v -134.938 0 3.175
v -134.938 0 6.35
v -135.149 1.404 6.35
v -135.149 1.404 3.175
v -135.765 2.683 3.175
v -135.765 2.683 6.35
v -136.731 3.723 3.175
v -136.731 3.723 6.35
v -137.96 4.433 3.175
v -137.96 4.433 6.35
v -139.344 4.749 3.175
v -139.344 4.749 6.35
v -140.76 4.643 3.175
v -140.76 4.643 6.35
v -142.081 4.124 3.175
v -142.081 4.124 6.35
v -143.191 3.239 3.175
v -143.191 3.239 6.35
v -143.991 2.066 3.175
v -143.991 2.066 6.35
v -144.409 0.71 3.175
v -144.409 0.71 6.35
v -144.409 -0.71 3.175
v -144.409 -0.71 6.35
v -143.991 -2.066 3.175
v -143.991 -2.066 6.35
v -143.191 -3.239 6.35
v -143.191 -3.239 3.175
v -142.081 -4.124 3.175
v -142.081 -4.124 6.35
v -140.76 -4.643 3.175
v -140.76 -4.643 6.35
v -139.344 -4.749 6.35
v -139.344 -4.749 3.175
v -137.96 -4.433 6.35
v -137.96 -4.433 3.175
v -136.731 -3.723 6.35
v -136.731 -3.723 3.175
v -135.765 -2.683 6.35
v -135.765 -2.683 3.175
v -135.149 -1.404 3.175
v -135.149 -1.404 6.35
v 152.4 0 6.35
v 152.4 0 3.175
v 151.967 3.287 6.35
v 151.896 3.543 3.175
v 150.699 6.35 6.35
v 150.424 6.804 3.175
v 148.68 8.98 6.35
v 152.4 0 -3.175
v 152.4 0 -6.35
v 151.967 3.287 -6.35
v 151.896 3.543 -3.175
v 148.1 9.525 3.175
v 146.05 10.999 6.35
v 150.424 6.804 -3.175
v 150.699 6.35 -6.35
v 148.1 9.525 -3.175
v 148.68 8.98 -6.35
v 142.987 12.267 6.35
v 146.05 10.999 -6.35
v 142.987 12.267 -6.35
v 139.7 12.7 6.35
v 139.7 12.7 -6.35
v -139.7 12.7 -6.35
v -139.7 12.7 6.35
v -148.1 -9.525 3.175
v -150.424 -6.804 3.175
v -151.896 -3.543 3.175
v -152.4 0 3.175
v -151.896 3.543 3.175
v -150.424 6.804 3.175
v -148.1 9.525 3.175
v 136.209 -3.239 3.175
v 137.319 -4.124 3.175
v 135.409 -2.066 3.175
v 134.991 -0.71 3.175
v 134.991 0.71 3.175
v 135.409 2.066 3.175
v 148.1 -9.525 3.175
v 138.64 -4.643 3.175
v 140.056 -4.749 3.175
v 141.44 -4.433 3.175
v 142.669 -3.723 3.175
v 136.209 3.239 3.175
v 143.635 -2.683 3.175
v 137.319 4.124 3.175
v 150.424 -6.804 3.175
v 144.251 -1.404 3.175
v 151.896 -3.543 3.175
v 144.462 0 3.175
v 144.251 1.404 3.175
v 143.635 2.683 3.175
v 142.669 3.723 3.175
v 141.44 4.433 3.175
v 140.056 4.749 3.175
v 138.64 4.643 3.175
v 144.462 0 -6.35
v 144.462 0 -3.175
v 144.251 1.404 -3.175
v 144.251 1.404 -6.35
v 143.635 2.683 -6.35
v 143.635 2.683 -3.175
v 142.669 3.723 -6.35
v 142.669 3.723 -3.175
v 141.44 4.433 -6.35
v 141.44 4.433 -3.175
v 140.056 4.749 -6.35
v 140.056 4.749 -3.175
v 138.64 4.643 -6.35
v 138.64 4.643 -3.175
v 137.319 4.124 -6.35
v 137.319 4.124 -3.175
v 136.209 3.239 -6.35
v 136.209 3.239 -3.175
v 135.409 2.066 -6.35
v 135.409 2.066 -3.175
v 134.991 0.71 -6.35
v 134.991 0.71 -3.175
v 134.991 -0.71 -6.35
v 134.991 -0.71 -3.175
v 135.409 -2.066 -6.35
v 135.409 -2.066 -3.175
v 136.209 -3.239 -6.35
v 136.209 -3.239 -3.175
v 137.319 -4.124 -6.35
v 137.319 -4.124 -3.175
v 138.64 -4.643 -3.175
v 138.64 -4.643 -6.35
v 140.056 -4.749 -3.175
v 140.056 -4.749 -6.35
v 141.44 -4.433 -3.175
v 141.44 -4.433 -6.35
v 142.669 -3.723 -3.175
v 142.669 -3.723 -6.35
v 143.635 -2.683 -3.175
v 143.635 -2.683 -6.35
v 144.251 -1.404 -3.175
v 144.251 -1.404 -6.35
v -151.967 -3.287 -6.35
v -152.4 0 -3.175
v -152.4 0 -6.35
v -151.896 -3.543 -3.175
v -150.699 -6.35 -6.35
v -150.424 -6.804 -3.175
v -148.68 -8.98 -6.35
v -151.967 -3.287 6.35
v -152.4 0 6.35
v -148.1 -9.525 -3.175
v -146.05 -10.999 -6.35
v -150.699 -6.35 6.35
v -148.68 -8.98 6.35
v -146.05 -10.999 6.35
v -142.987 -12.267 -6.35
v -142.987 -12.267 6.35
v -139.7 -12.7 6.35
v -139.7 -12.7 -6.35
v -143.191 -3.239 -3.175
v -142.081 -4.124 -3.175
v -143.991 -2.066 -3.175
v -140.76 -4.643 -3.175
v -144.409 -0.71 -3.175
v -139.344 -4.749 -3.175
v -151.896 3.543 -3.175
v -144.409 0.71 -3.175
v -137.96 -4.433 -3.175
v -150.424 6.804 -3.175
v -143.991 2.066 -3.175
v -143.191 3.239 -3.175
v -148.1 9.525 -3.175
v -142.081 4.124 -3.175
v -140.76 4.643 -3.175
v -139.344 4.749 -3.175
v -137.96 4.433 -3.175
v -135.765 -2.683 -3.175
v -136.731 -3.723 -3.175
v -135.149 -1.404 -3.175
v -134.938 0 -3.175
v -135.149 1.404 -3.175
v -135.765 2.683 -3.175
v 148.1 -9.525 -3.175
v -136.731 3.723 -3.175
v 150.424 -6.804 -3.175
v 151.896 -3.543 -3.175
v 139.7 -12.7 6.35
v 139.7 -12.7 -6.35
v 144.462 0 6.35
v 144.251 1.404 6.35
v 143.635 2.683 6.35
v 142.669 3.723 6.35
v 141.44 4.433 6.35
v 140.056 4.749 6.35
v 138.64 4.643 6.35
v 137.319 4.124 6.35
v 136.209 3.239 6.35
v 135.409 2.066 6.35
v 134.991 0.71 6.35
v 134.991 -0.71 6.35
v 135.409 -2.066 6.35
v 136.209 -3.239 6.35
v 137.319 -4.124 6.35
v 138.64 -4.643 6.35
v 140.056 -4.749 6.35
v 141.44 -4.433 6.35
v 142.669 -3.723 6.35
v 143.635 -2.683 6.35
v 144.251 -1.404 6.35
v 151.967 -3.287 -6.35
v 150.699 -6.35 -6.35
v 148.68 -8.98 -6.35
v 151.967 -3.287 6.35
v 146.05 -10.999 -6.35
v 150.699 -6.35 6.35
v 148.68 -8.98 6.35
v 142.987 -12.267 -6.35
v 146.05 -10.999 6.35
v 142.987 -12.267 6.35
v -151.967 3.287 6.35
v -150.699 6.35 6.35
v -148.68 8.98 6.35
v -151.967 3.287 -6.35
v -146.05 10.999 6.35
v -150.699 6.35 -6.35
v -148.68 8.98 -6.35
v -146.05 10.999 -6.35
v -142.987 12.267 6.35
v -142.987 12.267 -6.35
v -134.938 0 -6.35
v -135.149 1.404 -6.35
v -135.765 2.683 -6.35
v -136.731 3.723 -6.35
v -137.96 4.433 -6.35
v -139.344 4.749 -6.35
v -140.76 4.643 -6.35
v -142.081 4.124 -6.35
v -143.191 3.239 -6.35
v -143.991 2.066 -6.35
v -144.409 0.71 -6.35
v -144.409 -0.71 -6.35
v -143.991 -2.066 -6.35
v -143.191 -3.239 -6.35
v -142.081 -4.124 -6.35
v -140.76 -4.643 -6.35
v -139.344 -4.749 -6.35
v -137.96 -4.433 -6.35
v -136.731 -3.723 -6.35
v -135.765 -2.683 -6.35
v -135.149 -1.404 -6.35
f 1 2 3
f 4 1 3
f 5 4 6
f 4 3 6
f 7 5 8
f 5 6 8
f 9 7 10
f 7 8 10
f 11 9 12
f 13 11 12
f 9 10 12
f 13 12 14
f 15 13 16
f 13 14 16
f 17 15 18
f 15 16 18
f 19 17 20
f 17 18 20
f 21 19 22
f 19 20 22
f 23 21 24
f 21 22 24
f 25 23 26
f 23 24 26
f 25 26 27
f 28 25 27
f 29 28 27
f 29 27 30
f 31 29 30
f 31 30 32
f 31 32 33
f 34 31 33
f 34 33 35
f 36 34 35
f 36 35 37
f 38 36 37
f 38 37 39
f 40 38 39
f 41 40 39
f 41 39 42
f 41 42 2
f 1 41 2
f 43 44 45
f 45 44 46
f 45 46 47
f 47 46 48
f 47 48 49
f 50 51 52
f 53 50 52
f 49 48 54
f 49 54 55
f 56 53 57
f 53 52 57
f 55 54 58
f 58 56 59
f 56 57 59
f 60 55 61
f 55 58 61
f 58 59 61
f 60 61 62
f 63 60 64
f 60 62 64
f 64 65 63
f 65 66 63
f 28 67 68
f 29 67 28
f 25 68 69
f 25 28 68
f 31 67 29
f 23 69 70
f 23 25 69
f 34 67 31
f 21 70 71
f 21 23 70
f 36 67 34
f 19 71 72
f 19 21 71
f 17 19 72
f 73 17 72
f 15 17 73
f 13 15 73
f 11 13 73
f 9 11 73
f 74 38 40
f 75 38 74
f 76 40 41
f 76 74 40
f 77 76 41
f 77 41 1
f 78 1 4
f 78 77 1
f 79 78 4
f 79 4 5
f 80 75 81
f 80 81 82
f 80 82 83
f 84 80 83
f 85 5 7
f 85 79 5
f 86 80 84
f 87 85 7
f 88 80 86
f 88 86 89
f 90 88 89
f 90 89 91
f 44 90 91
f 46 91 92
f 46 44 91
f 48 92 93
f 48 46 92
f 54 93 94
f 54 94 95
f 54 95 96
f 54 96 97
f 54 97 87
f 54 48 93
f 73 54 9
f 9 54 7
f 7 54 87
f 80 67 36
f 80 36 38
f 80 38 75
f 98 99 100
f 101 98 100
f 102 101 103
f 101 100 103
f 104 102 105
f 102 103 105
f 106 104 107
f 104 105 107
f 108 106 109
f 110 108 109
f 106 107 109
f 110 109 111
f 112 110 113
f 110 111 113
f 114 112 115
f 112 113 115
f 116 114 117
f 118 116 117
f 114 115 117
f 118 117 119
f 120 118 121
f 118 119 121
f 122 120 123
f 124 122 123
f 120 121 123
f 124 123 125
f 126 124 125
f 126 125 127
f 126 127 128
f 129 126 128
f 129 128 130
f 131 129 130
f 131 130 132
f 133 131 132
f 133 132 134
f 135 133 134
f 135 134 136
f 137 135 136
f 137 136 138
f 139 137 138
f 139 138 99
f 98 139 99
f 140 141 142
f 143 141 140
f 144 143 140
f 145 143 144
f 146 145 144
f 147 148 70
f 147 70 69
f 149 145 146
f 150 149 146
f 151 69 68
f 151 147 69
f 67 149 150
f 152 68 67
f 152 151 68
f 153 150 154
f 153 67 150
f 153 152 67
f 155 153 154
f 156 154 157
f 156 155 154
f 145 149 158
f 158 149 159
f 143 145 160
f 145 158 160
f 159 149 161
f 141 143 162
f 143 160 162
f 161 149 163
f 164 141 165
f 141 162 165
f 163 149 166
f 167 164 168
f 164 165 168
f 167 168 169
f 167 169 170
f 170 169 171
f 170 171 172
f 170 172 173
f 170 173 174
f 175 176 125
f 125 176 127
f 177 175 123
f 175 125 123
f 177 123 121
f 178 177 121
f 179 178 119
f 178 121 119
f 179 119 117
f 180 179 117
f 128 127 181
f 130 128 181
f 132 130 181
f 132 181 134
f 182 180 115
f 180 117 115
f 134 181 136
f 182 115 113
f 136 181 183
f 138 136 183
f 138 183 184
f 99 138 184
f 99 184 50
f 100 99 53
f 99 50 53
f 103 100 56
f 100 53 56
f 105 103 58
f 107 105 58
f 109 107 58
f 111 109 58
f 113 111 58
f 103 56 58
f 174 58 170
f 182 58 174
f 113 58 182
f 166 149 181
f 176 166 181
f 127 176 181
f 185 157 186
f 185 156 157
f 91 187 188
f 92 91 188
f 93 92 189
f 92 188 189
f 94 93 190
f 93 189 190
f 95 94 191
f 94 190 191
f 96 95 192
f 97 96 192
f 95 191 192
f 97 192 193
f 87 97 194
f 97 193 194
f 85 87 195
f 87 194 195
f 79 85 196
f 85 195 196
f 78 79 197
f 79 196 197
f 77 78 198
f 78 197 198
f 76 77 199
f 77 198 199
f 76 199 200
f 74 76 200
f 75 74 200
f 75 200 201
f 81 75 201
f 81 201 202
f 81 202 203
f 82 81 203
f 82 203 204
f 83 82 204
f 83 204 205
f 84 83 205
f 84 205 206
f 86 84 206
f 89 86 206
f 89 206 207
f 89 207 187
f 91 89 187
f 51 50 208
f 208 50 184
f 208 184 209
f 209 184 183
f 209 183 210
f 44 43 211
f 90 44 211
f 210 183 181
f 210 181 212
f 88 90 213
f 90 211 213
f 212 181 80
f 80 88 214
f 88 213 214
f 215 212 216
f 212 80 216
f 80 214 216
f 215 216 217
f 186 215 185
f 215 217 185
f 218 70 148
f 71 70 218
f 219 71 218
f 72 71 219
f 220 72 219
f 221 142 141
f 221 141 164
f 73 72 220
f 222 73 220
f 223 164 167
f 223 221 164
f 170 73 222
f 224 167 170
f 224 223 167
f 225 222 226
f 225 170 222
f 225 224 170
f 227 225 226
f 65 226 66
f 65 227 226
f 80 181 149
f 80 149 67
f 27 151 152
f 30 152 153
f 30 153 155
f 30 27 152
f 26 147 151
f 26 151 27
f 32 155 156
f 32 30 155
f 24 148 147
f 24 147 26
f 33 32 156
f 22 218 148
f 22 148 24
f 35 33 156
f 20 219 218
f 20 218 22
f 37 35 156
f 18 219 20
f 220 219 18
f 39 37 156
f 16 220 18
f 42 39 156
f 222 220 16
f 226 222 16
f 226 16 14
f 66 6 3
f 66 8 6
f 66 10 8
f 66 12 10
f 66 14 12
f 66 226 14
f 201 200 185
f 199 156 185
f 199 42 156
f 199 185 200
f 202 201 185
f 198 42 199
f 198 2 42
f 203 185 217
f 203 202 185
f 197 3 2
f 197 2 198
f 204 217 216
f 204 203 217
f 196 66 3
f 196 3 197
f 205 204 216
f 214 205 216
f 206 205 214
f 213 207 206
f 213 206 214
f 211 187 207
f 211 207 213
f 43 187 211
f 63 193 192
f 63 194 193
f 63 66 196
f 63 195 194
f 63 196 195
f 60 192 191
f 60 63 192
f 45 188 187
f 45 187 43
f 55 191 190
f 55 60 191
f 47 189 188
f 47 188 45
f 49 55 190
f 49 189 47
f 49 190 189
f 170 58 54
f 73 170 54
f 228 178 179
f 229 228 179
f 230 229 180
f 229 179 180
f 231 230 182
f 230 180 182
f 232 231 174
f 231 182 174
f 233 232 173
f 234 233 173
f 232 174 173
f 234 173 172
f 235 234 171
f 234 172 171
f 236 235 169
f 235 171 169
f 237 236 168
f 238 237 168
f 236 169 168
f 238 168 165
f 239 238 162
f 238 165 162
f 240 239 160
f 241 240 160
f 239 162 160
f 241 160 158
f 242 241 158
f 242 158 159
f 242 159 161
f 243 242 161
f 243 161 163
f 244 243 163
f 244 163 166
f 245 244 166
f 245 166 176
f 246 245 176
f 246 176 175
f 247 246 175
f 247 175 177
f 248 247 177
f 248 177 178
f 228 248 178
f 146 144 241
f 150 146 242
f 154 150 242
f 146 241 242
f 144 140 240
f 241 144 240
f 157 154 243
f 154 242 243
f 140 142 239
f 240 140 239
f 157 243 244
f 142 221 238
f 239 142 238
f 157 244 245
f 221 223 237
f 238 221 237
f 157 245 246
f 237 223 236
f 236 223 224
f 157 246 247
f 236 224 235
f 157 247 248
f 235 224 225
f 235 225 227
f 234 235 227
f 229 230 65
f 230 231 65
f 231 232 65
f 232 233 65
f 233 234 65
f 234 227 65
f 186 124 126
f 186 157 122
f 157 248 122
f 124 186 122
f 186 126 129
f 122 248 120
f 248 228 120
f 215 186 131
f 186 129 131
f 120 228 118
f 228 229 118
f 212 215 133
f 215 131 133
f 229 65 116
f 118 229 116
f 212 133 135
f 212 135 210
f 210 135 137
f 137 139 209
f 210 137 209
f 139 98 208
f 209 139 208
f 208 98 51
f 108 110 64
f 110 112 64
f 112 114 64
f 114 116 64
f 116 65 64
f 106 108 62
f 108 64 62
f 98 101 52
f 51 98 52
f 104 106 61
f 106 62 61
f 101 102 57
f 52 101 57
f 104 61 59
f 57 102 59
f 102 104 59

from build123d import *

# Parameters (mm, degrees)
F0_W          = 304.8
F0_H          = 25.4
F1_DEPTH      = 6.35
F2_R          = 12.69999
F3_R          = 4.7625
F4_DEPTH      = 12.701
F5_W          = 19.05
F5_H          = 6.35
F6_DEPTH      = 152.401
F6_DEPTH_BACK = 152.401


# Not quite as in the source:
# - a fillet or chamfer is up to 0.001 mm smaller than in the source, because OpenCascade refuses the exact size


with BuildPart() as f1:
    # F0 (on Top) → F1 (new body, symmetric)
    with BuildSketch(Plane.XY):
        Rectangle(F0_W, F0_H)
    extrude(amount=F1_DEPTH, both=True)

    # F2 (radius 12.7 in the source; OpenCascade refuses exactly that, so slightly less here)
    f2_edges = [f1.edges().sort_by_distance(p)[0] for p in [
        (-152.4, 12.7, 0),
        (-152.4, -12.7, 0),
        (152.4, 12.7, 0),
        (152.4, -12.7, 0),
    ]]
    fillet(f2_edges, radius=F2_R)

    # F3 (on face) → F4 (cut, through all)
    with BuildSketch(Plane.XY.offset(6.35)):
        with Locations((-139.7, 0)):
            Circle(F3_R)
        with Locations((139.7, 0)):
            Circle(F3_R)
    extrude(amount=-F4_DEPTH, mode=Mode.SUBTRACT)

    # F5 (on Right) → F6 (cut, two sides)
    with BuildSketch(Plane.YZ) as f6_sk:
        Rectangle(F5_W, F5_H)
    extrude(amount=-F6_DEPTH, mode=Mode.SUBTRACT)
    extrude(f6_sk.sketch, amount=F6_DEPTH_BACK, mode=Mode.SUBTRACT)


solid = f1.part
